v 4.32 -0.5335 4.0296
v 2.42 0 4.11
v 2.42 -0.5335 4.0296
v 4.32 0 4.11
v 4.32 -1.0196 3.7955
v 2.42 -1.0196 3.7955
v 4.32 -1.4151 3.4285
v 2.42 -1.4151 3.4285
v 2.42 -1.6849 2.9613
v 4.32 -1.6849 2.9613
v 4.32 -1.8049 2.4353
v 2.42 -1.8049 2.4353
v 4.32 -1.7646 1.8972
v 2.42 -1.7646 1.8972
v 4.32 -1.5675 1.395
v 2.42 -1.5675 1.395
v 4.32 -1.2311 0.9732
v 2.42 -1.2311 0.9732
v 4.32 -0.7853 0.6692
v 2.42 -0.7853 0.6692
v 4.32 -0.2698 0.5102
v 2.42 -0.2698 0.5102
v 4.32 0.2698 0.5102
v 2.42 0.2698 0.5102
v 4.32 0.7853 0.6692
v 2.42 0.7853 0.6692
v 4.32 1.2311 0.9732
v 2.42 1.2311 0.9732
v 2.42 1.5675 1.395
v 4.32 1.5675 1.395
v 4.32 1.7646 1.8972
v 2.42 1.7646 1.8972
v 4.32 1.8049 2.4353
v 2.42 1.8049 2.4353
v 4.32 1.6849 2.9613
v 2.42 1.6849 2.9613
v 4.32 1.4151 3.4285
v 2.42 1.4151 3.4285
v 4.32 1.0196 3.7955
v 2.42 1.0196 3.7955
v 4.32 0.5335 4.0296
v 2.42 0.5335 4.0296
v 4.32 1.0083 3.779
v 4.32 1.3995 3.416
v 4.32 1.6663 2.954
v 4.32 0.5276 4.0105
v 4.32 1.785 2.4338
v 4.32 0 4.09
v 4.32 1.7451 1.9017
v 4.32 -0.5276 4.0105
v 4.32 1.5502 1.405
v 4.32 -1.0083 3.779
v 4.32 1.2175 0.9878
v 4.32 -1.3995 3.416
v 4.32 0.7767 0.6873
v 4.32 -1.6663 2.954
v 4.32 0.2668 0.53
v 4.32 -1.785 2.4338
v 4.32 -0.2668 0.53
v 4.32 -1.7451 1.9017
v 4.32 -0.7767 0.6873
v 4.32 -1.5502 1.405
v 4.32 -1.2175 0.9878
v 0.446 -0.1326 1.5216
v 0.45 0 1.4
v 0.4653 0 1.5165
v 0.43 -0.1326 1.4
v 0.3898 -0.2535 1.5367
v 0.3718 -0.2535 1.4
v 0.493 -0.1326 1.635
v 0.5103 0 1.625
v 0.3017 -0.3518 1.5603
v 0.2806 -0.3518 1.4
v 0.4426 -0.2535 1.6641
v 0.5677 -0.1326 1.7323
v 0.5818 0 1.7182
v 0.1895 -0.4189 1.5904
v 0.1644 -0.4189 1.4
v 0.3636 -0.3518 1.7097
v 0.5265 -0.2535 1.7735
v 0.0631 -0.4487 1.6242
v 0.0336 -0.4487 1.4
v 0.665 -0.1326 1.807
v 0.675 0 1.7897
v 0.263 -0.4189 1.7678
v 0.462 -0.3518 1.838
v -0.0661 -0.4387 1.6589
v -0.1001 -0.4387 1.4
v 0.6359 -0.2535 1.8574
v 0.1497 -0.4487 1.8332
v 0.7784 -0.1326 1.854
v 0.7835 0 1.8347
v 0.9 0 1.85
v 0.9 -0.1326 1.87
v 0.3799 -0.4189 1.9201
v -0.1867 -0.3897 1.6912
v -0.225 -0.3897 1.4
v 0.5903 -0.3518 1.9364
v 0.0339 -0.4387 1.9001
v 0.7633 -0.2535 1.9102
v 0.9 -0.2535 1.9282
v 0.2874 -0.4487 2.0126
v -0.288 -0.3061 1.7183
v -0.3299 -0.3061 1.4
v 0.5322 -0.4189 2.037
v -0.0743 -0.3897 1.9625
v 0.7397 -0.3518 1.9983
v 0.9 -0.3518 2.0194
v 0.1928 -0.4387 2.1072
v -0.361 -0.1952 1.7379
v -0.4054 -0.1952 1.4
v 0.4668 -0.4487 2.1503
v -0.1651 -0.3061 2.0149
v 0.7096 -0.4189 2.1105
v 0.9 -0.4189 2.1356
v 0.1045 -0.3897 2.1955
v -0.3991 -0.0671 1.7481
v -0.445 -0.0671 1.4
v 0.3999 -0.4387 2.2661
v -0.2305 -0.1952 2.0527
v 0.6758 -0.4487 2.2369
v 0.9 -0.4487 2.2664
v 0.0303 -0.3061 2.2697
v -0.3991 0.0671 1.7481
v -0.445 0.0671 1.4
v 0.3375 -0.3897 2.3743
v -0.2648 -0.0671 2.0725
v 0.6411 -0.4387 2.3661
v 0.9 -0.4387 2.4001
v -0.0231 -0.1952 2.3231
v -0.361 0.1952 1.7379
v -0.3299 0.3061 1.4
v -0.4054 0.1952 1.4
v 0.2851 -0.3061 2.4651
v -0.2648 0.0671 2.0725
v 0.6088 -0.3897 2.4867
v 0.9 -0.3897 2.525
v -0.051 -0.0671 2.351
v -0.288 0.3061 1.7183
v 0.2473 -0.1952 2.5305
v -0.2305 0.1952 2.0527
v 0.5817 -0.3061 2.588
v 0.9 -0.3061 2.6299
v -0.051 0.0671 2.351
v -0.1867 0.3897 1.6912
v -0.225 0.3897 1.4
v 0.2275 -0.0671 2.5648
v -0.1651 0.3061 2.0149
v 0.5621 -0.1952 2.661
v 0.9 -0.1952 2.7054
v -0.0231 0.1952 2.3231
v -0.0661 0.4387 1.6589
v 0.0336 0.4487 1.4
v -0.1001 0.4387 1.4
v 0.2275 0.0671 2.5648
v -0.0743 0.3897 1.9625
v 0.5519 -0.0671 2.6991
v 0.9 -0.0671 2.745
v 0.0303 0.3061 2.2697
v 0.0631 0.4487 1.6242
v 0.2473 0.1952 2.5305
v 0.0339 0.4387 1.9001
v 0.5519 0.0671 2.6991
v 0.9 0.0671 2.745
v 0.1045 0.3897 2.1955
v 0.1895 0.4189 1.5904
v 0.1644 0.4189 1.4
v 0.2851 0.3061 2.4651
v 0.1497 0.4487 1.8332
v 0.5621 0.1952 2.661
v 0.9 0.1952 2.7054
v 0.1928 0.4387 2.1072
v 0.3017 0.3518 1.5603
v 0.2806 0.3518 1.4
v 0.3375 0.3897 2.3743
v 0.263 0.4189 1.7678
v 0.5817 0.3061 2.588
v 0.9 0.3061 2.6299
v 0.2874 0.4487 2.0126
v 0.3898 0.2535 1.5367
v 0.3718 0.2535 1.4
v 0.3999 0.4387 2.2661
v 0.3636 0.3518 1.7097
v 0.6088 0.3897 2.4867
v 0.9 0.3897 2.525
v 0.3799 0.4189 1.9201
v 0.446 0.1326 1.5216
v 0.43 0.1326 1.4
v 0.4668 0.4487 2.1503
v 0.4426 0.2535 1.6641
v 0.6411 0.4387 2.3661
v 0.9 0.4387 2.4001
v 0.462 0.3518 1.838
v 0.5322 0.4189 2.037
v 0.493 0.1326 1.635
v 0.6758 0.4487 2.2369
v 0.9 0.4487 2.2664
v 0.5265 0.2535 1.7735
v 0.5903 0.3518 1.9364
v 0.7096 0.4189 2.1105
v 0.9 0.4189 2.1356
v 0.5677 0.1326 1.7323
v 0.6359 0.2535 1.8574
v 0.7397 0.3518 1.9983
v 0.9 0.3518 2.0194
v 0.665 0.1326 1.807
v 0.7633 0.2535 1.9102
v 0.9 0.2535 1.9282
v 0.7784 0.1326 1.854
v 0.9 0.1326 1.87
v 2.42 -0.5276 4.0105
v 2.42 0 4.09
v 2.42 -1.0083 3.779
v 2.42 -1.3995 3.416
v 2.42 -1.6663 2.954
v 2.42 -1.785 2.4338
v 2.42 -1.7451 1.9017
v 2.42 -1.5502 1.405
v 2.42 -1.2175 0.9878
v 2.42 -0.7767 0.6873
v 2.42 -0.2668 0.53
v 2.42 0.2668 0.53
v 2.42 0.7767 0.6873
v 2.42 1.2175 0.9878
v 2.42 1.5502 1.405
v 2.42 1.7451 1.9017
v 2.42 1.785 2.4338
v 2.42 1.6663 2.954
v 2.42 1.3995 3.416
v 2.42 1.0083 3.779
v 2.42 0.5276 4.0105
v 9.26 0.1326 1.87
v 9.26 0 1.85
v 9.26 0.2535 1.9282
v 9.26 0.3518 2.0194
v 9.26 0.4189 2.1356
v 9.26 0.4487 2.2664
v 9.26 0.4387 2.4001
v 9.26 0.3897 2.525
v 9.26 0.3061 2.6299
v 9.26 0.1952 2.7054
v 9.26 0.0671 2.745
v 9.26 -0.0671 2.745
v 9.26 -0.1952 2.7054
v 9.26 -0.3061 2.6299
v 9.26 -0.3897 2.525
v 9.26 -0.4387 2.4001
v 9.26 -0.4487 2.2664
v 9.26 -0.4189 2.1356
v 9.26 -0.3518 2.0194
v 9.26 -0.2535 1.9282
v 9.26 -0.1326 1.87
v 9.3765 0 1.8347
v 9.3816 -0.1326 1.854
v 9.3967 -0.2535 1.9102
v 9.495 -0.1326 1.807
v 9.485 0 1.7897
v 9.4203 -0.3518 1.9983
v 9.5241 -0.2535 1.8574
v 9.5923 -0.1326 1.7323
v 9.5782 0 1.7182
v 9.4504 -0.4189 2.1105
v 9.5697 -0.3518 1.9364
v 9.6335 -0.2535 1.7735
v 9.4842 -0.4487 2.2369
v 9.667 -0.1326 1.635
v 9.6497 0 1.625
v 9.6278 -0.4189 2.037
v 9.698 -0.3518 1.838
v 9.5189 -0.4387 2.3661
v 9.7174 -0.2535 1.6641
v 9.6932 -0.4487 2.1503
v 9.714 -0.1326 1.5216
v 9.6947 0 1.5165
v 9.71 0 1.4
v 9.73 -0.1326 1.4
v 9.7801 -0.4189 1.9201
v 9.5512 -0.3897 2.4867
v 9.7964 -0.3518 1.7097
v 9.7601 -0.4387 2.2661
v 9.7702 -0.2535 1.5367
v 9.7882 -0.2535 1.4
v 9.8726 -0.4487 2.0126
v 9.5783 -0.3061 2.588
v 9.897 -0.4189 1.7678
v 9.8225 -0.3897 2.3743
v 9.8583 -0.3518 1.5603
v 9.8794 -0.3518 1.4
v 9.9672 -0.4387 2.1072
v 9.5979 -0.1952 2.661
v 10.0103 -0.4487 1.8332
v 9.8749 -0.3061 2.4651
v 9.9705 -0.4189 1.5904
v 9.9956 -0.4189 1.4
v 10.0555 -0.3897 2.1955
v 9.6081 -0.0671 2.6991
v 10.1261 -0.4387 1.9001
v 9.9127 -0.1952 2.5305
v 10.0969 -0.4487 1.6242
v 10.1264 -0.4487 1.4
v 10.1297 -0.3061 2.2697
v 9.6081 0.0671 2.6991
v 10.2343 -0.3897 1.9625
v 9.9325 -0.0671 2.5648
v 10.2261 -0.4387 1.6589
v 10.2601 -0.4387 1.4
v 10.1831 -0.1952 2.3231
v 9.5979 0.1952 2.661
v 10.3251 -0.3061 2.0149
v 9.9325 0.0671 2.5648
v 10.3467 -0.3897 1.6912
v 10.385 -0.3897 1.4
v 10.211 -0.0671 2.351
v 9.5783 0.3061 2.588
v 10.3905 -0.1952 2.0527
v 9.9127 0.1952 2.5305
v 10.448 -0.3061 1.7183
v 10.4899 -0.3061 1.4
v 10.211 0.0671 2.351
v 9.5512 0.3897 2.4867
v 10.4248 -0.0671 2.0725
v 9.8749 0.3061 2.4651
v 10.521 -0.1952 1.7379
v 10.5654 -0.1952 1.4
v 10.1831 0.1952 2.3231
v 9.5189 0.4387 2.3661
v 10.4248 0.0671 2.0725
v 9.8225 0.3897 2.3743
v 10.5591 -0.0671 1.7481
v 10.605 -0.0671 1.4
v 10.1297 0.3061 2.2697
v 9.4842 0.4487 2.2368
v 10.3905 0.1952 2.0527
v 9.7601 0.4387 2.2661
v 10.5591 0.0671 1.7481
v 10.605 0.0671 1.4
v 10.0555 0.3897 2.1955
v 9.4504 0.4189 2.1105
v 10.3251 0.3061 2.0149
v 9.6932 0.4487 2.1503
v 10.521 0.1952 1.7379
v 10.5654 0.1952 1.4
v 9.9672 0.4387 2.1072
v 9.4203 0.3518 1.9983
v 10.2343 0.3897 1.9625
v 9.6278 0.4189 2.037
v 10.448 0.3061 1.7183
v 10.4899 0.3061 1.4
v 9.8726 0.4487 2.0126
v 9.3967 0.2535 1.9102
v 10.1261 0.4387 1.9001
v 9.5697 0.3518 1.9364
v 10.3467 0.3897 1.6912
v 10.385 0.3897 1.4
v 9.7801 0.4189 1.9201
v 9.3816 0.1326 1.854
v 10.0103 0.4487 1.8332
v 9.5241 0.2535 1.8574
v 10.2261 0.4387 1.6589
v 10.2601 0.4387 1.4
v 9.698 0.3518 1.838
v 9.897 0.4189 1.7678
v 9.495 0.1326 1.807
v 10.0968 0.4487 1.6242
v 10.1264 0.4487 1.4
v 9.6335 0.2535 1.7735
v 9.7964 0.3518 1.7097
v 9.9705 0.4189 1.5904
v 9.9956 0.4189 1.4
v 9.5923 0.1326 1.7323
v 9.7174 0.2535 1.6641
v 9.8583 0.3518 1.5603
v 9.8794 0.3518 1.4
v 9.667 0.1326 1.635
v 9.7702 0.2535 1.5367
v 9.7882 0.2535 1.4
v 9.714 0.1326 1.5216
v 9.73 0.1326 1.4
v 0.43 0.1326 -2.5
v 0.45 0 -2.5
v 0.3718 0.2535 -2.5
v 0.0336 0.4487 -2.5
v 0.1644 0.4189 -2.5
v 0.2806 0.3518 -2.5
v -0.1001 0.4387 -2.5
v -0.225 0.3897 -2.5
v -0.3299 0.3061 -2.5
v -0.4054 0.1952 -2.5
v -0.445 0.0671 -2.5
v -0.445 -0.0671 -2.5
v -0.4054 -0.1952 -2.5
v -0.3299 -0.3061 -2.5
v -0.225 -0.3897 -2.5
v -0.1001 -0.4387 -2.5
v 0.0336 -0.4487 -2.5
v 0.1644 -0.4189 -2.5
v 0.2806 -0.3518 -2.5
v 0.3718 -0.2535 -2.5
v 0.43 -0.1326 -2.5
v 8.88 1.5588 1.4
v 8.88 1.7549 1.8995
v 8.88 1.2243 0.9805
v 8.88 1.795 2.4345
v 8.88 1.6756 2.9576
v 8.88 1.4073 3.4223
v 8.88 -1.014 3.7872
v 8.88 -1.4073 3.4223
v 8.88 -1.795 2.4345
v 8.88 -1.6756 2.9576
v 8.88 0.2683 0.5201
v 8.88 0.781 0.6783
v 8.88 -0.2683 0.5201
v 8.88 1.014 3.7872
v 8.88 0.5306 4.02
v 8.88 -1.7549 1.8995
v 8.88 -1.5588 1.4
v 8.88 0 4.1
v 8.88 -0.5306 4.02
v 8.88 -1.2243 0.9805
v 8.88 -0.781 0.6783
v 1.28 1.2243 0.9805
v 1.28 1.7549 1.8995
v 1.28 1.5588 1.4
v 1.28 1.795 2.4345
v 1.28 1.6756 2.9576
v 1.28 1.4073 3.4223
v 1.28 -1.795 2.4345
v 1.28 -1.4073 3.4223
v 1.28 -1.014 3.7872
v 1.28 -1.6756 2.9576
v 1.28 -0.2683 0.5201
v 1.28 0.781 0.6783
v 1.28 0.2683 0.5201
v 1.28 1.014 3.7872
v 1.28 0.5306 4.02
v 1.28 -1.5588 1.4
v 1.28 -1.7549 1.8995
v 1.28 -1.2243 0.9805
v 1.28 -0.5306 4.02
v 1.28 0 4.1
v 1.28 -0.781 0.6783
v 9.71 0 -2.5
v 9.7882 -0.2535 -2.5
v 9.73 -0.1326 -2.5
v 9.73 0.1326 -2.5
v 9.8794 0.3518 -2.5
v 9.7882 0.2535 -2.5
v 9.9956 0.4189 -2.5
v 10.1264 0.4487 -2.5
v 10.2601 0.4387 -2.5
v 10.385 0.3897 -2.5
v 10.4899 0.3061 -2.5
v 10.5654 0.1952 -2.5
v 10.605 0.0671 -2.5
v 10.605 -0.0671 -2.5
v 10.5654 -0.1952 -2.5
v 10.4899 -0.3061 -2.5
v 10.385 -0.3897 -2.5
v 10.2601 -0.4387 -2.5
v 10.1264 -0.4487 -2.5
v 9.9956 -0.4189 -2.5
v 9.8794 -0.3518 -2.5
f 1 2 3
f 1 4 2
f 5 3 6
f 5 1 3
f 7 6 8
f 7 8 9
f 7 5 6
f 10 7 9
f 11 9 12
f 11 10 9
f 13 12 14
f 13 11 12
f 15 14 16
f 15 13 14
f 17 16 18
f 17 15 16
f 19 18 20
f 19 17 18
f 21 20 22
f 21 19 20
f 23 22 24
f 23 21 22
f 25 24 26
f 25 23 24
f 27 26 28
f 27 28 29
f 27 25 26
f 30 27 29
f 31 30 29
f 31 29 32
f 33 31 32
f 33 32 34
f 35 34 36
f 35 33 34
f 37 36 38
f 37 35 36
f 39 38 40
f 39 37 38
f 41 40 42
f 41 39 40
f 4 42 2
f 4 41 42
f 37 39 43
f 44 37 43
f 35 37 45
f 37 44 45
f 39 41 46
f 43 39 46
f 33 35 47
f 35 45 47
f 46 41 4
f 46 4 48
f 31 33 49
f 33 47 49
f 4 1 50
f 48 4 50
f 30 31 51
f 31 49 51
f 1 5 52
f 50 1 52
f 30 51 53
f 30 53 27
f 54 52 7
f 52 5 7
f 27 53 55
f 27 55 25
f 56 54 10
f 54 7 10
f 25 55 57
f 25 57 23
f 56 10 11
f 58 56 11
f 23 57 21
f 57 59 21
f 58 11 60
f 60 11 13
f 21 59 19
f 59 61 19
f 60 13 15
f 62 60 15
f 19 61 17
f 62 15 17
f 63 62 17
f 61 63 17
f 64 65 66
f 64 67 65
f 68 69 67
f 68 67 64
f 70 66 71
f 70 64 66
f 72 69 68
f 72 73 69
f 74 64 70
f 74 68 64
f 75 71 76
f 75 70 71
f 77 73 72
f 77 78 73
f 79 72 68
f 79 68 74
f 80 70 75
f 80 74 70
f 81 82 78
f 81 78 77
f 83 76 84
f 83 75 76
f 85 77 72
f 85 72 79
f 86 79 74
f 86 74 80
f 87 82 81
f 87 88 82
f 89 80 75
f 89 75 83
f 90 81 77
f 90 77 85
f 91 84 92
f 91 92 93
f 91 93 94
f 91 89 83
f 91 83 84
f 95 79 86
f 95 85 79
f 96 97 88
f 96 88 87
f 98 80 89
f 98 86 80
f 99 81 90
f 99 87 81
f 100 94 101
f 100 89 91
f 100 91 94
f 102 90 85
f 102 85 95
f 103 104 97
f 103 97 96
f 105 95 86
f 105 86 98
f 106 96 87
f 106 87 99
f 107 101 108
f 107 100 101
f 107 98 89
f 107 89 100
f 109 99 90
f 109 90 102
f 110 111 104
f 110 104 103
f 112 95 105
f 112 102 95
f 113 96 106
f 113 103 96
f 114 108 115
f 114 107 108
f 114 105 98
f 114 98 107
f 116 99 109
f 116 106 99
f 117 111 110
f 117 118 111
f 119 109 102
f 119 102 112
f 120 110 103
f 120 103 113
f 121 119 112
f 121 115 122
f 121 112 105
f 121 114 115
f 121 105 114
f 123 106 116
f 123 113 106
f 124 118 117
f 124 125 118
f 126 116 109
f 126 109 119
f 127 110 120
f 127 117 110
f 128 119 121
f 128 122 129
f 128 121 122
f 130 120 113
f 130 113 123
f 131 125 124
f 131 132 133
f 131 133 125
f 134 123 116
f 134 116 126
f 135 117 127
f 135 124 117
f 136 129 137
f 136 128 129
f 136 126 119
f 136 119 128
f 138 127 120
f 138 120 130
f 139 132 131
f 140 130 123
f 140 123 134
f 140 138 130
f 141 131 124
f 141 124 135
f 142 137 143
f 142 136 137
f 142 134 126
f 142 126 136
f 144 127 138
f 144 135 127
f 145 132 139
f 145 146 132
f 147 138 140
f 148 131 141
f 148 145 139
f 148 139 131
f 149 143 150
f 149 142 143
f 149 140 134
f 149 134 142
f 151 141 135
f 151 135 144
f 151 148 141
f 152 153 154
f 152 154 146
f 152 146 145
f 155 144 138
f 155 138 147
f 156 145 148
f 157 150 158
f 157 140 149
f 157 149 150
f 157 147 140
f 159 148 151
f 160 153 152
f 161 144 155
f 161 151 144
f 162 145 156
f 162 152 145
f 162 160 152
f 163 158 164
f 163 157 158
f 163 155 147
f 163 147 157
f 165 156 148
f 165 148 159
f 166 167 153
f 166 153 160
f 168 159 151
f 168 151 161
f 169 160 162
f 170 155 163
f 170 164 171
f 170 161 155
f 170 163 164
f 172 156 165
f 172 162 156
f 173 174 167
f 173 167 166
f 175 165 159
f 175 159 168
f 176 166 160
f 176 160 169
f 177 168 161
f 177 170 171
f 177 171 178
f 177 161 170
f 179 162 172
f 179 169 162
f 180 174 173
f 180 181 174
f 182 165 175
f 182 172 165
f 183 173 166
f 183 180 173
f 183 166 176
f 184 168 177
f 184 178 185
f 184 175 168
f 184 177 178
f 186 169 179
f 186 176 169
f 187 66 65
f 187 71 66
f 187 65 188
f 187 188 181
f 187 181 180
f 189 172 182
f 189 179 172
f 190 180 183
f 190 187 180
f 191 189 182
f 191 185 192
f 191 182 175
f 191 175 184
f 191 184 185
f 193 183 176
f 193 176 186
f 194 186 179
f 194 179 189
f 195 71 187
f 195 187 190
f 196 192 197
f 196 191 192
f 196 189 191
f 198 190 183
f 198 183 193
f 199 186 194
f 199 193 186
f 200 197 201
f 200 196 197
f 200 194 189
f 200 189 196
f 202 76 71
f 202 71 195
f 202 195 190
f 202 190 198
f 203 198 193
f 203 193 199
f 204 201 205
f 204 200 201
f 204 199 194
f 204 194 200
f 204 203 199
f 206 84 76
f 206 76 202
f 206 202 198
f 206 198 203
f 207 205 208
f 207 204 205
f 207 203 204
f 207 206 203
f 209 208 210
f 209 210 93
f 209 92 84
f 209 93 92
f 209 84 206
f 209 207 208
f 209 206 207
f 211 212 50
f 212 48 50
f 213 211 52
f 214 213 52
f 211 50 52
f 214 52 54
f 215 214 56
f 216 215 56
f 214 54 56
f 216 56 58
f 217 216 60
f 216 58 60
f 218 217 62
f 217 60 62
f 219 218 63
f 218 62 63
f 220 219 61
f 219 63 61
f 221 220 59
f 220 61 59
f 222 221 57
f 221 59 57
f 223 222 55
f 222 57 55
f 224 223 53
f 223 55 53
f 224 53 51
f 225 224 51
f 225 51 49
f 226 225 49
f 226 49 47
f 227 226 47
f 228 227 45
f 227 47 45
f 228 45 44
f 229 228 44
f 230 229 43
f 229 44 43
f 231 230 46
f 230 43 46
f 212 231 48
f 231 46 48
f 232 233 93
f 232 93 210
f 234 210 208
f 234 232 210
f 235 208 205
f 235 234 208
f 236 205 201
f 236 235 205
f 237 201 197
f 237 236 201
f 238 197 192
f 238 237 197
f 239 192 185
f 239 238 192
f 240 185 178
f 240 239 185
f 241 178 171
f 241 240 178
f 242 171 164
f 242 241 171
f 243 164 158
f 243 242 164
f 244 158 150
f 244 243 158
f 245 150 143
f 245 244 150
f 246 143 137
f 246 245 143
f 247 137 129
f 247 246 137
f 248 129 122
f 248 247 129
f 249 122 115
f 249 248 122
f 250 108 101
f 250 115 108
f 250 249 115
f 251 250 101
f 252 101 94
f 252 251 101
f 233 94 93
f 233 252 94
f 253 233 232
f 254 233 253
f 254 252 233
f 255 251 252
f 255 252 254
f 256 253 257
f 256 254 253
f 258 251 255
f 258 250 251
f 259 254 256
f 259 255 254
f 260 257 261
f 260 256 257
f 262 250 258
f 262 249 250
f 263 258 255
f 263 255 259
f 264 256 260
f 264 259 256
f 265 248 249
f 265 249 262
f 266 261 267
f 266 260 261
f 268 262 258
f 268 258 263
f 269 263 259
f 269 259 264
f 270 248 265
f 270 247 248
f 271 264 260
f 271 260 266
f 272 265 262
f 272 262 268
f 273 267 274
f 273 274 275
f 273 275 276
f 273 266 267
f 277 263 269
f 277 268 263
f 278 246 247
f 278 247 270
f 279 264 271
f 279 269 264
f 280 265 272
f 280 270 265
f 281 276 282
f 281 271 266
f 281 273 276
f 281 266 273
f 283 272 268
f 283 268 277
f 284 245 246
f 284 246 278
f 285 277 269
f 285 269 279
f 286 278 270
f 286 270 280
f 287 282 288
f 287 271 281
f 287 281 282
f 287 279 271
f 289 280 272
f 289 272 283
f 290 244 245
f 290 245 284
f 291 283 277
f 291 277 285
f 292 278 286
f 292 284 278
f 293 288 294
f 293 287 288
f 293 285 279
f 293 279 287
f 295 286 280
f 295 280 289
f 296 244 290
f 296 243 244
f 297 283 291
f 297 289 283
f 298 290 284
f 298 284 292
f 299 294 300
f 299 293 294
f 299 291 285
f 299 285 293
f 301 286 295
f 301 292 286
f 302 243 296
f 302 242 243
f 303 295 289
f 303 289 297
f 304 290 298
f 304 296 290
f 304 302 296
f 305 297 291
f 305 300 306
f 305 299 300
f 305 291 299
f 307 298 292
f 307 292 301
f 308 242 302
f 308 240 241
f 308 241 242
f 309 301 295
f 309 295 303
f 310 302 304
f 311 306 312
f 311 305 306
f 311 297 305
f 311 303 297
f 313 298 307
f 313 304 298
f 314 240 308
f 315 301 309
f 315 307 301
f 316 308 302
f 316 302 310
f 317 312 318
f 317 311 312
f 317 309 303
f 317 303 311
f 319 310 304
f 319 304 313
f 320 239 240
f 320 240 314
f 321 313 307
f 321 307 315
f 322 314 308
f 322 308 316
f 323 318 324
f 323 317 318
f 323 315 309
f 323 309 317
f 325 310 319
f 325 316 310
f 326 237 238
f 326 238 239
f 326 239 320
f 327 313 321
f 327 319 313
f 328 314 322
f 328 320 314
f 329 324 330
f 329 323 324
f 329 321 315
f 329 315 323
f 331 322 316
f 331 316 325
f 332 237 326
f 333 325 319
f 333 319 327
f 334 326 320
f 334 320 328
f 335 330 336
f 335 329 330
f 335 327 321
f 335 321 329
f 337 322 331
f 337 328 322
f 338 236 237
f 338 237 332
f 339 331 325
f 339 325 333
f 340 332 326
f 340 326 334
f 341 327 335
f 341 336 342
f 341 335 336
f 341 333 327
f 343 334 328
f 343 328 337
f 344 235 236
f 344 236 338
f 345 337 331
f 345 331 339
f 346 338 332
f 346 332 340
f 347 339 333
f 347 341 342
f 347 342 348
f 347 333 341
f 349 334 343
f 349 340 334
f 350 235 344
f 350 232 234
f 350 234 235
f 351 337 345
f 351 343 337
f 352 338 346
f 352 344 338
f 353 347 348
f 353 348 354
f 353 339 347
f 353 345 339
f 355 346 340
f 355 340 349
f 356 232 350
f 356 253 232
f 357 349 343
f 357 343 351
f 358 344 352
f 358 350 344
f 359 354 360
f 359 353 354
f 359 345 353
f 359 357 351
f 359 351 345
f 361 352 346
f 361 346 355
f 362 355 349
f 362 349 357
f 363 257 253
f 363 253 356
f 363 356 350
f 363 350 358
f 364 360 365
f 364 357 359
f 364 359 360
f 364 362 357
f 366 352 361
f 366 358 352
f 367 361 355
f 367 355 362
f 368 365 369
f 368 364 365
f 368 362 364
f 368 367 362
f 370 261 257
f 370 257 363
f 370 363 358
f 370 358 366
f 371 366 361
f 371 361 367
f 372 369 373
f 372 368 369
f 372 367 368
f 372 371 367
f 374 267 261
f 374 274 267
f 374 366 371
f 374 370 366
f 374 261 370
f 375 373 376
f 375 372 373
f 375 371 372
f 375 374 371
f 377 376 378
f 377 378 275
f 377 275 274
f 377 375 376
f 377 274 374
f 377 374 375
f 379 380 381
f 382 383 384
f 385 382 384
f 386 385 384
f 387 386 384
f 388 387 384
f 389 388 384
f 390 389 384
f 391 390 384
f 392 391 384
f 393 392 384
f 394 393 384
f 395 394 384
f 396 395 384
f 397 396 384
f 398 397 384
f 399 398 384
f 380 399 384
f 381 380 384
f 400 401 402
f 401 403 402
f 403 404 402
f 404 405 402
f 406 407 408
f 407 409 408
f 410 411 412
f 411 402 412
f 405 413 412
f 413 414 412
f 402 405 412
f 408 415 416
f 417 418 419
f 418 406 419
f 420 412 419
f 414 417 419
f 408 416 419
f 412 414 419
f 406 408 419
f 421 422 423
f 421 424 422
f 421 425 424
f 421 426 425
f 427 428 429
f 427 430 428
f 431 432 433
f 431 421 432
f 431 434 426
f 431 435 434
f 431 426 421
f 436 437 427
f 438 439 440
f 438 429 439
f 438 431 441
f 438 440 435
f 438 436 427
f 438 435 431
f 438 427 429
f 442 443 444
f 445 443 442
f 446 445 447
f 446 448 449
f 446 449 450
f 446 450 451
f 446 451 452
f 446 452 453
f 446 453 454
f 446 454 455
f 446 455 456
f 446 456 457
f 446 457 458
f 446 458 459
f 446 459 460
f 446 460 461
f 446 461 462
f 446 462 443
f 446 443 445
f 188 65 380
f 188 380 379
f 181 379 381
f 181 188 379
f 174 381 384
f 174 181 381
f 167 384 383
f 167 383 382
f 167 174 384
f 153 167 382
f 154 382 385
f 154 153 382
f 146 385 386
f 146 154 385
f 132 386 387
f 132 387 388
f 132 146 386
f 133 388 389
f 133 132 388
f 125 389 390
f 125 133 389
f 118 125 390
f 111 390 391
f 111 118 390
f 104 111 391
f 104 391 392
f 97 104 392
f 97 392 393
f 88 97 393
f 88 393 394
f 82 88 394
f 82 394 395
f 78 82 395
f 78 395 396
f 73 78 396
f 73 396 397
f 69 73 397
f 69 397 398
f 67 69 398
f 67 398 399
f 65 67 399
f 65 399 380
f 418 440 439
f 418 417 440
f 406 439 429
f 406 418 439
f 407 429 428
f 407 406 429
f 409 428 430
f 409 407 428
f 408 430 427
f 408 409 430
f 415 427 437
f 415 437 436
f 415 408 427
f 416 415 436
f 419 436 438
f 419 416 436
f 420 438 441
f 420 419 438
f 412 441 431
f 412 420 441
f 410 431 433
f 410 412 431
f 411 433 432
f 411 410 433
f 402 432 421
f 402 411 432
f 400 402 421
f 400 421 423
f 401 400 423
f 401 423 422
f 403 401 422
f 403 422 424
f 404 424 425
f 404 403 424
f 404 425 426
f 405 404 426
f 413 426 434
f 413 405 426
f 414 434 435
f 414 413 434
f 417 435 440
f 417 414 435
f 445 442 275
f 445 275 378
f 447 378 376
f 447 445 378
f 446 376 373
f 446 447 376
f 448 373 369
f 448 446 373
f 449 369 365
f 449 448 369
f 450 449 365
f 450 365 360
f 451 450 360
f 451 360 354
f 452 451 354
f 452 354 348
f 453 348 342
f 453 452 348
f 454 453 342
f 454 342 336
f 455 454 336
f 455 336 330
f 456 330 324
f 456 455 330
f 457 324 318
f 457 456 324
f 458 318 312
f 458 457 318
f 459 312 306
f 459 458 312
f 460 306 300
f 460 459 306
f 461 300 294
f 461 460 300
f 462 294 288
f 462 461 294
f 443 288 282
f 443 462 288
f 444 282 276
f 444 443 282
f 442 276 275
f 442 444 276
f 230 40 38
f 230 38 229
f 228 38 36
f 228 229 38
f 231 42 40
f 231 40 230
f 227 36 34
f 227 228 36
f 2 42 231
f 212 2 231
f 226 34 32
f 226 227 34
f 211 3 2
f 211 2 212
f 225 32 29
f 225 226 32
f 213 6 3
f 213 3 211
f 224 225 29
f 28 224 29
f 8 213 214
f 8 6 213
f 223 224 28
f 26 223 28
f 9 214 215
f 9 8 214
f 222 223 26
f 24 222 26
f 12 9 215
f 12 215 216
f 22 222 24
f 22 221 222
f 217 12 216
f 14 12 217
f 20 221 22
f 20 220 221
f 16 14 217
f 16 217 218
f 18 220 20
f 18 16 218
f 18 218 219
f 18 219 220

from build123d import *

# Parameters (mm, degrees)
SKETCH002_W = 7.6
SKETCH002_H = 1.8
SKETCH003_W = 1.9
SKETCH003_H = 0.02
SKETCH_R    = 0.45


with BuildPart() as revolution:
    # Sketch002 → Revolution (revolve)
    with BuildSketch(Plane.XZ):
        with Locations((5.08, 3.2)):
            Rectangle(SKETCH002_W, SKETCH002_H)
    revolve(axis=Axis((1.28, 0, 2.3), (1, 0, 0)))


with BuildPart() as revolution001:
    # Sketch003 → Revolution001 (revolve)
    with BuildSketch(Plane.XZ):
        with Locations((3.37, 4.1)):
            Rectangle(SKETCH003_W, SKETCH003_H)
    revolve(axis=Axis((0, 0, 2.3), (1, 0, 0)))


with BuildPart() as sweep_body:
    # Sweep: sweep along a path in Sketch001
    with BuildLine(Plane.XZ) as sweep_path:
        Line((0, -2.5), (0, 1.4))
        ThreePointArc((0, 1.4), (0.263604, 2.036396), (0.9, 2.3))
        Line((0.9, 2.3), (9.26, 2.3))
        ThreePointArc((9.26, 2.3), (9.896396, 2.036396), (10.16, 1.4))
        Line((10.16, 1.4), (10.16, -2.5))
    # Sketch → Sweep (sweep)
    with BuildSketch(Plane.XY.offset(-2)):
        Circle(SKETCH_R)
    sweep(path=sweep_path.line)


solid = Compound([revolution.part, revolution001.part, sweep_body.part])
